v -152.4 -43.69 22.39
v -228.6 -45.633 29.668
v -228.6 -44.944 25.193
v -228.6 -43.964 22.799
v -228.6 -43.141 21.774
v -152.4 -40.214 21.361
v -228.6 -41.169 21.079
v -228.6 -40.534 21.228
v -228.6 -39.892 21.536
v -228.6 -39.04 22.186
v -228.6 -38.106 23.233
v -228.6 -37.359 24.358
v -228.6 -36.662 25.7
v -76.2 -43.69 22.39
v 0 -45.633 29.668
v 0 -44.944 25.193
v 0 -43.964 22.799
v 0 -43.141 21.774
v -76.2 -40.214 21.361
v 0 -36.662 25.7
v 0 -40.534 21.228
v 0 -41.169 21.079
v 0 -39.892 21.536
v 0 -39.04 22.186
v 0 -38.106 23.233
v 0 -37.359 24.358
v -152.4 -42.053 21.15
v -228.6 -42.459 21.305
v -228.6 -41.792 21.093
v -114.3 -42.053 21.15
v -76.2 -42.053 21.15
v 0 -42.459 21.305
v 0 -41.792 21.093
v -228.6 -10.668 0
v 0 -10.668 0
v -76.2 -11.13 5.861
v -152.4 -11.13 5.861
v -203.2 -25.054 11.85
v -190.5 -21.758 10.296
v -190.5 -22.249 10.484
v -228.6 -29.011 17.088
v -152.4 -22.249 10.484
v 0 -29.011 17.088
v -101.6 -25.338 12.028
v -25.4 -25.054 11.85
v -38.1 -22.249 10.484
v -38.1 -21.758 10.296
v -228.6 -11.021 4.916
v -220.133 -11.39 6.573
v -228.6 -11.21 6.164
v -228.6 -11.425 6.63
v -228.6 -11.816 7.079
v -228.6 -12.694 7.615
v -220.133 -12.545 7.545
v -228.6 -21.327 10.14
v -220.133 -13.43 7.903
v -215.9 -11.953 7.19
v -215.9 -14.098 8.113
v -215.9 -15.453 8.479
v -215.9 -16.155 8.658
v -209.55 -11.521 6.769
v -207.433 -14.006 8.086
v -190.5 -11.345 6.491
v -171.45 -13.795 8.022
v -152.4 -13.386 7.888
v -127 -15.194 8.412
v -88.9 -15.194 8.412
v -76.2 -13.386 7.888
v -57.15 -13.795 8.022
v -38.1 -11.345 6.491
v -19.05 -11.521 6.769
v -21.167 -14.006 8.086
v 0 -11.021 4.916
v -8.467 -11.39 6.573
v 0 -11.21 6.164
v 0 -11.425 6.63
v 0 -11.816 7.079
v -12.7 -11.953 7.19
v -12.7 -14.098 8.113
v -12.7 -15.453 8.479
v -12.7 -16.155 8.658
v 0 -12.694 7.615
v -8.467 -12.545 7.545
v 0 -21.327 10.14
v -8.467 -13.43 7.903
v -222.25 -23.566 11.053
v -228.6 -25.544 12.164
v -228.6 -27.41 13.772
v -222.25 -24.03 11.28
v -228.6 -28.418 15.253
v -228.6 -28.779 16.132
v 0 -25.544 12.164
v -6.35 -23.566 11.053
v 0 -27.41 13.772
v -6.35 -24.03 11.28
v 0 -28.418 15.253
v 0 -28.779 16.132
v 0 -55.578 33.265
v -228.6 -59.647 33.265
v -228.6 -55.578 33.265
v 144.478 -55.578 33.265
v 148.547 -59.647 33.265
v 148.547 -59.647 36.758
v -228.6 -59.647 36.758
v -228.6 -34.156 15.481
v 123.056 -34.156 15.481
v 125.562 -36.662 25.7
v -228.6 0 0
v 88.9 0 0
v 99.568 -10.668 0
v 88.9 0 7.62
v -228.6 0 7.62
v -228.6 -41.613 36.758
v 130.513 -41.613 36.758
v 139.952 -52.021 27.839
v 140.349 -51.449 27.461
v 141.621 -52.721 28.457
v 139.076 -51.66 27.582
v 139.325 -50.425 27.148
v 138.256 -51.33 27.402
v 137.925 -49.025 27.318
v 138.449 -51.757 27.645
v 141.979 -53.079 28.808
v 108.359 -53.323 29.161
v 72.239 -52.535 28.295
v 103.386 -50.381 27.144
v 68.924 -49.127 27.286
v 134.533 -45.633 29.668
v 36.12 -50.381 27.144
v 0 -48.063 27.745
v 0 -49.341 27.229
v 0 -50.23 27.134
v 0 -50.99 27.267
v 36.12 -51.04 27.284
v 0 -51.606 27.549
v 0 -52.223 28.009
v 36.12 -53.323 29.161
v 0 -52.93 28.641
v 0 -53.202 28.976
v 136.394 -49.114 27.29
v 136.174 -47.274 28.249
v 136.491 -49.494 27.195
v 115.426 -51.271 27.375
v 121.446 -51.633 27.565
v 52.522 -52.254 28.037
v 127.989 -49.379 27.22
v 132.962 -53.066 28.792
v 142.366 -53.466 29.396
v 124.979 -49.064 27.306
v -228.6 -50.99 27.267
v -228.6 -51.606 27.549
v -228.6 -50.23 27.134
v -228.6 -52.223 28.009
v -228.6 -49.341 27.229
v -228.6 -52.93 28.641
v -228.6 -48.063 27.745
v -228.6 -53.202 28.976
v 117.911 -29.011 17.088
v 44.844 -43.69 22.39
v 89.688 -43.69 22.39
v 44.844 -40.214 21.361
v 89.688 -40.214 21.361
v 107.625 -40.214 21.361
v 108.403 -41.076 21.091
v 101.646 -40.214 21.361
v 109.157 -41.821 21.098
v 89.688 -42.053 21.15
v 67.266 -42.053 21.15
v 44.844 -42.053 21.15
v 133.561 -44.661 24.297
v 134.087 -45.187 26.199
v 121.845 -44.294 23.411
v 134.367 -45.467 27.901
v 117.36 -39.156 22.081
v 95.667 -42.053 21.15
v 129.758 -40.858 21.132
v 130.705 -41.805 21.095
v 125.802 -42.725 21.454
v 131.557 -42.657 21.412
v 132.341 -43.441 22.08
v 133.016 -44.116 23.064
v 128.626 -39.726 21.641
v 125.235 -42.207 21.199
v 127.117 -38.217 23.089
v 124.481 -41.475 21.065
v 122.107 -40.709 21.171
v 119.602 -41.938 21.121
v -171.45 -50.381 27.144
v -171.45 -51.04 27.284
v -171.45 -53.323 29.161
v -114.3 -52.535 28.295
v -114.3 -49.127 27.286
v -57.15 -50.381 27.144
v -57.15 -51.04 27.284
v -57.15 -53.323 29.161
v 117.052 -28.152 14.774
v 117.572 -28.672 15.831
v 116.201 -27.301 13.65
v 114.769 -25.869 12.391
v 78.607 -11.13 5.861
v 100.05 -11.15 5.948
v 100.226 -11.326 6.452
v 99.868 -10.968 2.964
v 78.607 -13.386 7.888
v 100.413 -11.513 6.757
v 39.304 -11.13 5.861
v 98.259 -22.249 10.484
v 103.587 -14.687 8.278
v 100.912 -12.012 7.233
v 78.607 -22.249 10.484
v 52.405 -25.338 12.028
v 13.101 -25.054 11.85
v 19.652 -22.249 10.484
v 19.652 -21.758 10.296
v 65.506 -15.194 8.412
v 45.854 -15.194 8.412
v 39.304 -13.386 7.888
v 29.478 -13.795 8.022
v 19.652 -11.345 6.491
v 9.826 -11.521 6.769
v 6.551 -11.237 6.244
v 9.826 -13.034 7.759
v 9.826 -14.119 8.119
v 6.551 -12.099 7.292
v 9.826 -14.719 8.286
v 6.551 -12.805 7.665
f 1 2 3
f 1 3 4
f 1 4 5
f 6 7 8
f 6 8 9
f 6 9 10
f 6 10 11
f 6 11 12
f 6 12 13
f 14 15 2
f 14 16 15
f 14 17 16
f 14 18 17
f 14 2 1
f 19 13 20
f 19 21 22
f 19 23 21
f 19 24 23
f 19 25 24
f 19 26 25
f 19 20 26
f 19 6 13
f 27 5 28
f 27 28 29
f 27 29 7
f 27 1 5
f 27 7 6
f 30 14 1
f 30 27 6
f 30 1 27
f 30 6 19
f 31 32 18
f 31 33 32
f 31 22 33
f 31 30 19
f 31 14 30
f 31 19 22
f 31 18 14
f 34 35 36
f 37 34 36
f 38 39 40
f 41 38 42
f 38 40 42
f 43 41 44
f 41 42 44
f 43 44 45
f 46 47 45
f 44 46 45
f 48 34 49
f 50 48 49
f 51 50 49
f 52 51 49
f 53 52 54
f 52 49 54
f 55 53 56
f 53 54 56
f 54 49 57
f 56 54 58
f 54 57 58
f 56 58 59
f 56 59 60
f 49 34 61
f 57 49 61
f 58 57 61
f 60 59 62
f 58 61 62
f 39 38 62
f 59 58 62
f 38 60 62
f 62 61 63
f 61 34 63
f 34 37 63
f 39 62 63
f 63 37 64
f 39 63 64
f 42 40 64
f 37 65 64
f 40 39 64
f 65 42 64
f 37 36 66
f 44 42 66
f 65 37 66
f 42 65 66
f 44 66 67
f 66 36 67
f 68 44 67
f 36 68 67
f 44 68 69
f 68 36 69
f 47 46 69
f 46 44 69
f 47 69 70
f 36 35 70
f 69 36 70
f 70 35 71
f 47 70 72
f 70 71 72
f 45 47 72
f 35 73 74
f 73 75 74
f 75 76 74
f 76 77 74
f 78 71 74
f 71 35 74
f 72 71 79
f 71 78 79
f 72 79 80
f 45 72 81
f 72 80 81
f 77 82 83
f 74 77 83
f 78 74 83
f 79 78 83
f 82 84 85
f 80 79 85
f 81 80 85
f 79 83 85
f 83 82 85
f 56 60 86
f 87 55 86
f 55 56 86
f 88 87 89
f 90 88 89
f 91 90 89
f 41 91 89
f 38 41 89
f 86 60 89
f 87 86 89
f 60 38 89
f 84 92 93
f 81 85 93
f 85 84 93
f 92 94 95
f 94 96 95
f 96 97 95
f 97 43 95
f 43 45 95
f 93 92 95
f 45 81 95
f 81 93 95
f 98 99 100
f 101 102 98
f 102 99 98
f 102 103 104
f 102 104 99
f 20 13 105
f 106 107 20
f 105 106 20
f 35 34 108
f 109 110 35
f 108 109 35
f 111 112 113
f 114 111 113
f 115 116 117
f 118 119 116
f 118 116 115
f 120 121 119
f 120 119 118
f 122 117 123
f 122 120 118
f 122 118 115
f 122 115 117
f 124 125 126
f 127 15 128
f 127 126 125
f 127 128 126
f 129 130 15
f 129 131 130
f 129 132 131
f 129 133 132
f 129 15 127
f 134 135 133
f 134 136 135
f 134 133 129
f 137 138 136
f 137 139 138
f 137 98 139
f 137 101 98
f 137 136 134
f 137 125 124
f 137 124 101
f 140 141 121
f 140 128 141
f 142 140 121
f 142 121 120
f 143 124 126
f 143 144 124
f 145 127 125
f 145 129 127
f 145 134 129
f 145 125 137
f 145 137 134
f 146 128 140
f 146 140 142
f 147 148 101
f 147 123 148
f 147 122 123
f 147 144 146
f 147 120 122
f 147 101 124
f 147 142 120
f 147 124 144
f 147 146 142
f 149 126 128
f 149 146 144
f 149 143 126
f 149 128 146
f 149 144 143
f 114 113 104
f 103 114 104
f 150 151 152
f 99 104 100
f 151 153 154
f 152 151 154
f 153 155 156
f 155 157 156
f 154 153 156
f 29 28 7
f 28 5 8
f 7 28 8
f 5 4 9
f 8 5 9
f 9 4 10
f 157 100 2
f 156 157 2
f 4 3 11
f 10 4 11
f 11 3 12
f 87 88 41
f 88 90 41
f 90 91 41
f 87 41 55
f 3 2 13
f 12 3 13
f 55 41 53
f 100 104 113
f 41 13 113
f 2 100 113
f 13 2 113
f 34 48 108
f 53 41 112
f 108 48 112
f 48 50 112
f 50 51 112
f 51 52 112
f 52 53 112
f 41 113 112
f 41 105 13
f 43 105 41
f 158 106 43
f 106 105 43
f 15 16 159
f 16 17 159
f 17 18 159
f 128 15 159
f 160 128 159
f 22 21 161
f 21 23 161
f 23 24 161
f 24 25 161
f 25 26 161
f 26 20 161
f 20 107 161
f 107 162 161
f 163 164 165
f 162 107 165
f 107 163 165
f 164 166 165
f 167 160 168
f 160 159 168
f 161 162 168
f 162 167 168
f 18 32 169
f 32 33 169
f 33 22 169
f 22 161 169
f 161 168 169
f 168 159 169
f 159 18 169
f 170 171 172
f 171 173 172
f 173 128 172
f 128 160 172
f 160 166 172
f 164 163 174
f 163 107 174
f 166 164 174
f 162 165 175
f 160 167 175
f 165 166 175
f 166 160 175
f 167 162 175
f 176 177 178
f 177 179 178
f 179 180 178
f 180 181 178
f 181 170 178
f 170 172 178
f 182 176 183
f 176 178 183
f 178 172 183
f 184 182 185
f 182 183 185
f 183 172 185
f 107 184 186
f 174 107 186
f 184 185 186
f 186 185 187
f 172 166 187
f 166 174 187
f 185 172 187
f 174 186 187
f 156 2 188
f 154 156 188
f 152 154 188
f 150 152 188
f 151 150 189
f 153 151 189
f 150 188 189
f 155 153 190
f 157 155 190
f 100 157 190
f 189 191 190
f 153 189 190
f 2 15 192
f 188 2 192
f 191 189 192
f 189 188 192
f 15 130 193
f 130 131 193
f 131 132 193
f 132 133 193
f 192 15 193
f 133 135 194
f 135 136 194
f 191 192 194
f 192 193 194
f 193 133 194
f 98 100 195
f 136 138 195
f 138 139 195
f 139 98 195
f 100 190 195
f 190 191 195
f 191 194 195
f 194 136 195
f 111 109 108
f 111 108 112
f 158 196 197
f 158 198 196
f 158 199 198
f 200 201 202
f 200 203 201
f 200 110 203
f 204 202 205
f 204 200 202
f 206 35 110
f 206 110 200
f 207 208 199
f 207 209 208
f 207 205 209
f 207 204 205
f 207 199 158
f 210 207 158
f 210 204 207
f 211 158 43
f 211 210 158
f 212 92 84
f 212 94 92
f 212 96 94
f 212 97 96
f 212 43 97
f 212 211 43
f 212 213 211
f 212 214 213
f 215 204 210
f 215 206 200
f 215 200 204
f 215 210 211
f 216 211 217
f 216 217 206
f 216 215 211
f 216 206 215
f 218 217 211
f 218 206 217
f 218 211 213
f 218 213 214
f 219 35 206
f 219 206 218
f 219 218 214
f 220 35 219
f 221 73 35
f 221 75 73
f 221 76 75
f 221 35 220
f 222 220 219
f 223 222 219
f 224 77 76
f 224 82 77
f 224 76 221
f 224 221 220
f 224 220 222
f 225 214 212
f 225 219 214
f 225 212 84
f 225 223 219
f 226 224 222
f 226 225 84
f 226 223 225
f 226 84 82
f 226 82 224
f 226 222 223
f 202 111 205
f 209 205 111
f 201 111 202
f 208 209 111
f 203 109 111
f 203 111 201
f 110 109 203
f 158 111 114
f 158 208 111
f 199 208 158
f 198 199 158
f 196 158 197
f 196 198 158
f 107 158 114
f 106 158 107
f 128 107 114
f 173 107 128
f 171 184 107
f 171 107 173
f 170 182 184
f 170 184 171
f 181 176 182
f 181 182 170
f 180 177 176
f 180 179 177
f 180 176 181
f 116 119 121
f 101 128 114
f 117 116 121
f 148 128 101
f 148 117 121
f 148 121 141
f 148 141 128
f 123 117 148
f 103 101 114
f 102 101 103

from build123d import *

# Parameters (mm, degrees)
F1_DEPTH      = 177.8
F1_DEPTH_BACK = 228.6
F3_DEPTH      = 36.7586830666


# Not quite as in the source:
# - a feature names something its author has since deleted; it is built from what else it names


with BuildPart() as f1:
    # F0 (on Right) → F1 (new body, two sides)
    with BuildSketch(Plane.YZ) as f1_sk:
        with BuildLine():
            Line((0, 0), (0, 7.62))
            Line((0, 7.62), (-41.6129238499, 36.7576829666))
            Line((-41.6129238499, 36.7576829666), (-59.6469238499, 36.7576829666))
            Line((-59.6469238499, 36.7576829666), (-59.6469238499, 33.2651829666))
            Line((-59.6469238499, 33.2651829666), (-55.5780977011, 33.2651829666))
            add(Edge.make_bspline(
                [(-45.6326596341, 29.6676454746), (-49.8473398191, 25.4529652896), (-53.5381393586, 29.571723151), (-52.9344401232, 28.3239668416), (-55.5780977011, 33.2651829666)],
                knots=[0, 0, 0, 0, 0.5235508263, 1, 1, 1, 1], degree=3))
            add(Edge.make_bspline(
                [(-45.6326596341, 29.6676454746), (-44.9426054856, 18.9718303883), (-39.7672124109, 18.9718303883), (-36.6619780561, 25.6998443657)],
                knots=[0, 0, 0, 0, 9.8090047208, 9.8090047208, 9.8090047208, 9.8090047208], degree=3))
            Line((-36.6619780561, 25.6998443657), (-34.1559106391, 15.4807388001))
            Line((-34.1559106391, 15.4807388001), (-29.0110725909, 17.0878581703))
            add(Edge.make_bspline(
                [(-10.668, 0), (-11.1556913461, 2.7848342744), (-10.6612735812, 5.9386353992), (-12.9440118592, 8.7641226677), (-27.9097380346, 10.3951310482), (-29.0110725909, 17.0878581703)],
                knots=[0, 0, 0, 0, 0.2878148332, 0.4945394705, 1, 1, 1, 1], degree=3))
            Line((-10.668, 0), (0, 0))
        make_face()
    extrude(amount=F1_DEPTH)
    extrude(f1_sk.sketch, amount=-F1_DEPTH_BACK)

    # F2 (on Top) → F3 (cut, through all)
    with BuildSketch(Plane.XY):
        Polygon((184.1130062819, 0), (88.9, 0), (184.1130062819, -95.2130062819), align=None)
    extrude(amount=F3_DEPTH, mode=Mode.SUBTRACT)


solid = f1.part
